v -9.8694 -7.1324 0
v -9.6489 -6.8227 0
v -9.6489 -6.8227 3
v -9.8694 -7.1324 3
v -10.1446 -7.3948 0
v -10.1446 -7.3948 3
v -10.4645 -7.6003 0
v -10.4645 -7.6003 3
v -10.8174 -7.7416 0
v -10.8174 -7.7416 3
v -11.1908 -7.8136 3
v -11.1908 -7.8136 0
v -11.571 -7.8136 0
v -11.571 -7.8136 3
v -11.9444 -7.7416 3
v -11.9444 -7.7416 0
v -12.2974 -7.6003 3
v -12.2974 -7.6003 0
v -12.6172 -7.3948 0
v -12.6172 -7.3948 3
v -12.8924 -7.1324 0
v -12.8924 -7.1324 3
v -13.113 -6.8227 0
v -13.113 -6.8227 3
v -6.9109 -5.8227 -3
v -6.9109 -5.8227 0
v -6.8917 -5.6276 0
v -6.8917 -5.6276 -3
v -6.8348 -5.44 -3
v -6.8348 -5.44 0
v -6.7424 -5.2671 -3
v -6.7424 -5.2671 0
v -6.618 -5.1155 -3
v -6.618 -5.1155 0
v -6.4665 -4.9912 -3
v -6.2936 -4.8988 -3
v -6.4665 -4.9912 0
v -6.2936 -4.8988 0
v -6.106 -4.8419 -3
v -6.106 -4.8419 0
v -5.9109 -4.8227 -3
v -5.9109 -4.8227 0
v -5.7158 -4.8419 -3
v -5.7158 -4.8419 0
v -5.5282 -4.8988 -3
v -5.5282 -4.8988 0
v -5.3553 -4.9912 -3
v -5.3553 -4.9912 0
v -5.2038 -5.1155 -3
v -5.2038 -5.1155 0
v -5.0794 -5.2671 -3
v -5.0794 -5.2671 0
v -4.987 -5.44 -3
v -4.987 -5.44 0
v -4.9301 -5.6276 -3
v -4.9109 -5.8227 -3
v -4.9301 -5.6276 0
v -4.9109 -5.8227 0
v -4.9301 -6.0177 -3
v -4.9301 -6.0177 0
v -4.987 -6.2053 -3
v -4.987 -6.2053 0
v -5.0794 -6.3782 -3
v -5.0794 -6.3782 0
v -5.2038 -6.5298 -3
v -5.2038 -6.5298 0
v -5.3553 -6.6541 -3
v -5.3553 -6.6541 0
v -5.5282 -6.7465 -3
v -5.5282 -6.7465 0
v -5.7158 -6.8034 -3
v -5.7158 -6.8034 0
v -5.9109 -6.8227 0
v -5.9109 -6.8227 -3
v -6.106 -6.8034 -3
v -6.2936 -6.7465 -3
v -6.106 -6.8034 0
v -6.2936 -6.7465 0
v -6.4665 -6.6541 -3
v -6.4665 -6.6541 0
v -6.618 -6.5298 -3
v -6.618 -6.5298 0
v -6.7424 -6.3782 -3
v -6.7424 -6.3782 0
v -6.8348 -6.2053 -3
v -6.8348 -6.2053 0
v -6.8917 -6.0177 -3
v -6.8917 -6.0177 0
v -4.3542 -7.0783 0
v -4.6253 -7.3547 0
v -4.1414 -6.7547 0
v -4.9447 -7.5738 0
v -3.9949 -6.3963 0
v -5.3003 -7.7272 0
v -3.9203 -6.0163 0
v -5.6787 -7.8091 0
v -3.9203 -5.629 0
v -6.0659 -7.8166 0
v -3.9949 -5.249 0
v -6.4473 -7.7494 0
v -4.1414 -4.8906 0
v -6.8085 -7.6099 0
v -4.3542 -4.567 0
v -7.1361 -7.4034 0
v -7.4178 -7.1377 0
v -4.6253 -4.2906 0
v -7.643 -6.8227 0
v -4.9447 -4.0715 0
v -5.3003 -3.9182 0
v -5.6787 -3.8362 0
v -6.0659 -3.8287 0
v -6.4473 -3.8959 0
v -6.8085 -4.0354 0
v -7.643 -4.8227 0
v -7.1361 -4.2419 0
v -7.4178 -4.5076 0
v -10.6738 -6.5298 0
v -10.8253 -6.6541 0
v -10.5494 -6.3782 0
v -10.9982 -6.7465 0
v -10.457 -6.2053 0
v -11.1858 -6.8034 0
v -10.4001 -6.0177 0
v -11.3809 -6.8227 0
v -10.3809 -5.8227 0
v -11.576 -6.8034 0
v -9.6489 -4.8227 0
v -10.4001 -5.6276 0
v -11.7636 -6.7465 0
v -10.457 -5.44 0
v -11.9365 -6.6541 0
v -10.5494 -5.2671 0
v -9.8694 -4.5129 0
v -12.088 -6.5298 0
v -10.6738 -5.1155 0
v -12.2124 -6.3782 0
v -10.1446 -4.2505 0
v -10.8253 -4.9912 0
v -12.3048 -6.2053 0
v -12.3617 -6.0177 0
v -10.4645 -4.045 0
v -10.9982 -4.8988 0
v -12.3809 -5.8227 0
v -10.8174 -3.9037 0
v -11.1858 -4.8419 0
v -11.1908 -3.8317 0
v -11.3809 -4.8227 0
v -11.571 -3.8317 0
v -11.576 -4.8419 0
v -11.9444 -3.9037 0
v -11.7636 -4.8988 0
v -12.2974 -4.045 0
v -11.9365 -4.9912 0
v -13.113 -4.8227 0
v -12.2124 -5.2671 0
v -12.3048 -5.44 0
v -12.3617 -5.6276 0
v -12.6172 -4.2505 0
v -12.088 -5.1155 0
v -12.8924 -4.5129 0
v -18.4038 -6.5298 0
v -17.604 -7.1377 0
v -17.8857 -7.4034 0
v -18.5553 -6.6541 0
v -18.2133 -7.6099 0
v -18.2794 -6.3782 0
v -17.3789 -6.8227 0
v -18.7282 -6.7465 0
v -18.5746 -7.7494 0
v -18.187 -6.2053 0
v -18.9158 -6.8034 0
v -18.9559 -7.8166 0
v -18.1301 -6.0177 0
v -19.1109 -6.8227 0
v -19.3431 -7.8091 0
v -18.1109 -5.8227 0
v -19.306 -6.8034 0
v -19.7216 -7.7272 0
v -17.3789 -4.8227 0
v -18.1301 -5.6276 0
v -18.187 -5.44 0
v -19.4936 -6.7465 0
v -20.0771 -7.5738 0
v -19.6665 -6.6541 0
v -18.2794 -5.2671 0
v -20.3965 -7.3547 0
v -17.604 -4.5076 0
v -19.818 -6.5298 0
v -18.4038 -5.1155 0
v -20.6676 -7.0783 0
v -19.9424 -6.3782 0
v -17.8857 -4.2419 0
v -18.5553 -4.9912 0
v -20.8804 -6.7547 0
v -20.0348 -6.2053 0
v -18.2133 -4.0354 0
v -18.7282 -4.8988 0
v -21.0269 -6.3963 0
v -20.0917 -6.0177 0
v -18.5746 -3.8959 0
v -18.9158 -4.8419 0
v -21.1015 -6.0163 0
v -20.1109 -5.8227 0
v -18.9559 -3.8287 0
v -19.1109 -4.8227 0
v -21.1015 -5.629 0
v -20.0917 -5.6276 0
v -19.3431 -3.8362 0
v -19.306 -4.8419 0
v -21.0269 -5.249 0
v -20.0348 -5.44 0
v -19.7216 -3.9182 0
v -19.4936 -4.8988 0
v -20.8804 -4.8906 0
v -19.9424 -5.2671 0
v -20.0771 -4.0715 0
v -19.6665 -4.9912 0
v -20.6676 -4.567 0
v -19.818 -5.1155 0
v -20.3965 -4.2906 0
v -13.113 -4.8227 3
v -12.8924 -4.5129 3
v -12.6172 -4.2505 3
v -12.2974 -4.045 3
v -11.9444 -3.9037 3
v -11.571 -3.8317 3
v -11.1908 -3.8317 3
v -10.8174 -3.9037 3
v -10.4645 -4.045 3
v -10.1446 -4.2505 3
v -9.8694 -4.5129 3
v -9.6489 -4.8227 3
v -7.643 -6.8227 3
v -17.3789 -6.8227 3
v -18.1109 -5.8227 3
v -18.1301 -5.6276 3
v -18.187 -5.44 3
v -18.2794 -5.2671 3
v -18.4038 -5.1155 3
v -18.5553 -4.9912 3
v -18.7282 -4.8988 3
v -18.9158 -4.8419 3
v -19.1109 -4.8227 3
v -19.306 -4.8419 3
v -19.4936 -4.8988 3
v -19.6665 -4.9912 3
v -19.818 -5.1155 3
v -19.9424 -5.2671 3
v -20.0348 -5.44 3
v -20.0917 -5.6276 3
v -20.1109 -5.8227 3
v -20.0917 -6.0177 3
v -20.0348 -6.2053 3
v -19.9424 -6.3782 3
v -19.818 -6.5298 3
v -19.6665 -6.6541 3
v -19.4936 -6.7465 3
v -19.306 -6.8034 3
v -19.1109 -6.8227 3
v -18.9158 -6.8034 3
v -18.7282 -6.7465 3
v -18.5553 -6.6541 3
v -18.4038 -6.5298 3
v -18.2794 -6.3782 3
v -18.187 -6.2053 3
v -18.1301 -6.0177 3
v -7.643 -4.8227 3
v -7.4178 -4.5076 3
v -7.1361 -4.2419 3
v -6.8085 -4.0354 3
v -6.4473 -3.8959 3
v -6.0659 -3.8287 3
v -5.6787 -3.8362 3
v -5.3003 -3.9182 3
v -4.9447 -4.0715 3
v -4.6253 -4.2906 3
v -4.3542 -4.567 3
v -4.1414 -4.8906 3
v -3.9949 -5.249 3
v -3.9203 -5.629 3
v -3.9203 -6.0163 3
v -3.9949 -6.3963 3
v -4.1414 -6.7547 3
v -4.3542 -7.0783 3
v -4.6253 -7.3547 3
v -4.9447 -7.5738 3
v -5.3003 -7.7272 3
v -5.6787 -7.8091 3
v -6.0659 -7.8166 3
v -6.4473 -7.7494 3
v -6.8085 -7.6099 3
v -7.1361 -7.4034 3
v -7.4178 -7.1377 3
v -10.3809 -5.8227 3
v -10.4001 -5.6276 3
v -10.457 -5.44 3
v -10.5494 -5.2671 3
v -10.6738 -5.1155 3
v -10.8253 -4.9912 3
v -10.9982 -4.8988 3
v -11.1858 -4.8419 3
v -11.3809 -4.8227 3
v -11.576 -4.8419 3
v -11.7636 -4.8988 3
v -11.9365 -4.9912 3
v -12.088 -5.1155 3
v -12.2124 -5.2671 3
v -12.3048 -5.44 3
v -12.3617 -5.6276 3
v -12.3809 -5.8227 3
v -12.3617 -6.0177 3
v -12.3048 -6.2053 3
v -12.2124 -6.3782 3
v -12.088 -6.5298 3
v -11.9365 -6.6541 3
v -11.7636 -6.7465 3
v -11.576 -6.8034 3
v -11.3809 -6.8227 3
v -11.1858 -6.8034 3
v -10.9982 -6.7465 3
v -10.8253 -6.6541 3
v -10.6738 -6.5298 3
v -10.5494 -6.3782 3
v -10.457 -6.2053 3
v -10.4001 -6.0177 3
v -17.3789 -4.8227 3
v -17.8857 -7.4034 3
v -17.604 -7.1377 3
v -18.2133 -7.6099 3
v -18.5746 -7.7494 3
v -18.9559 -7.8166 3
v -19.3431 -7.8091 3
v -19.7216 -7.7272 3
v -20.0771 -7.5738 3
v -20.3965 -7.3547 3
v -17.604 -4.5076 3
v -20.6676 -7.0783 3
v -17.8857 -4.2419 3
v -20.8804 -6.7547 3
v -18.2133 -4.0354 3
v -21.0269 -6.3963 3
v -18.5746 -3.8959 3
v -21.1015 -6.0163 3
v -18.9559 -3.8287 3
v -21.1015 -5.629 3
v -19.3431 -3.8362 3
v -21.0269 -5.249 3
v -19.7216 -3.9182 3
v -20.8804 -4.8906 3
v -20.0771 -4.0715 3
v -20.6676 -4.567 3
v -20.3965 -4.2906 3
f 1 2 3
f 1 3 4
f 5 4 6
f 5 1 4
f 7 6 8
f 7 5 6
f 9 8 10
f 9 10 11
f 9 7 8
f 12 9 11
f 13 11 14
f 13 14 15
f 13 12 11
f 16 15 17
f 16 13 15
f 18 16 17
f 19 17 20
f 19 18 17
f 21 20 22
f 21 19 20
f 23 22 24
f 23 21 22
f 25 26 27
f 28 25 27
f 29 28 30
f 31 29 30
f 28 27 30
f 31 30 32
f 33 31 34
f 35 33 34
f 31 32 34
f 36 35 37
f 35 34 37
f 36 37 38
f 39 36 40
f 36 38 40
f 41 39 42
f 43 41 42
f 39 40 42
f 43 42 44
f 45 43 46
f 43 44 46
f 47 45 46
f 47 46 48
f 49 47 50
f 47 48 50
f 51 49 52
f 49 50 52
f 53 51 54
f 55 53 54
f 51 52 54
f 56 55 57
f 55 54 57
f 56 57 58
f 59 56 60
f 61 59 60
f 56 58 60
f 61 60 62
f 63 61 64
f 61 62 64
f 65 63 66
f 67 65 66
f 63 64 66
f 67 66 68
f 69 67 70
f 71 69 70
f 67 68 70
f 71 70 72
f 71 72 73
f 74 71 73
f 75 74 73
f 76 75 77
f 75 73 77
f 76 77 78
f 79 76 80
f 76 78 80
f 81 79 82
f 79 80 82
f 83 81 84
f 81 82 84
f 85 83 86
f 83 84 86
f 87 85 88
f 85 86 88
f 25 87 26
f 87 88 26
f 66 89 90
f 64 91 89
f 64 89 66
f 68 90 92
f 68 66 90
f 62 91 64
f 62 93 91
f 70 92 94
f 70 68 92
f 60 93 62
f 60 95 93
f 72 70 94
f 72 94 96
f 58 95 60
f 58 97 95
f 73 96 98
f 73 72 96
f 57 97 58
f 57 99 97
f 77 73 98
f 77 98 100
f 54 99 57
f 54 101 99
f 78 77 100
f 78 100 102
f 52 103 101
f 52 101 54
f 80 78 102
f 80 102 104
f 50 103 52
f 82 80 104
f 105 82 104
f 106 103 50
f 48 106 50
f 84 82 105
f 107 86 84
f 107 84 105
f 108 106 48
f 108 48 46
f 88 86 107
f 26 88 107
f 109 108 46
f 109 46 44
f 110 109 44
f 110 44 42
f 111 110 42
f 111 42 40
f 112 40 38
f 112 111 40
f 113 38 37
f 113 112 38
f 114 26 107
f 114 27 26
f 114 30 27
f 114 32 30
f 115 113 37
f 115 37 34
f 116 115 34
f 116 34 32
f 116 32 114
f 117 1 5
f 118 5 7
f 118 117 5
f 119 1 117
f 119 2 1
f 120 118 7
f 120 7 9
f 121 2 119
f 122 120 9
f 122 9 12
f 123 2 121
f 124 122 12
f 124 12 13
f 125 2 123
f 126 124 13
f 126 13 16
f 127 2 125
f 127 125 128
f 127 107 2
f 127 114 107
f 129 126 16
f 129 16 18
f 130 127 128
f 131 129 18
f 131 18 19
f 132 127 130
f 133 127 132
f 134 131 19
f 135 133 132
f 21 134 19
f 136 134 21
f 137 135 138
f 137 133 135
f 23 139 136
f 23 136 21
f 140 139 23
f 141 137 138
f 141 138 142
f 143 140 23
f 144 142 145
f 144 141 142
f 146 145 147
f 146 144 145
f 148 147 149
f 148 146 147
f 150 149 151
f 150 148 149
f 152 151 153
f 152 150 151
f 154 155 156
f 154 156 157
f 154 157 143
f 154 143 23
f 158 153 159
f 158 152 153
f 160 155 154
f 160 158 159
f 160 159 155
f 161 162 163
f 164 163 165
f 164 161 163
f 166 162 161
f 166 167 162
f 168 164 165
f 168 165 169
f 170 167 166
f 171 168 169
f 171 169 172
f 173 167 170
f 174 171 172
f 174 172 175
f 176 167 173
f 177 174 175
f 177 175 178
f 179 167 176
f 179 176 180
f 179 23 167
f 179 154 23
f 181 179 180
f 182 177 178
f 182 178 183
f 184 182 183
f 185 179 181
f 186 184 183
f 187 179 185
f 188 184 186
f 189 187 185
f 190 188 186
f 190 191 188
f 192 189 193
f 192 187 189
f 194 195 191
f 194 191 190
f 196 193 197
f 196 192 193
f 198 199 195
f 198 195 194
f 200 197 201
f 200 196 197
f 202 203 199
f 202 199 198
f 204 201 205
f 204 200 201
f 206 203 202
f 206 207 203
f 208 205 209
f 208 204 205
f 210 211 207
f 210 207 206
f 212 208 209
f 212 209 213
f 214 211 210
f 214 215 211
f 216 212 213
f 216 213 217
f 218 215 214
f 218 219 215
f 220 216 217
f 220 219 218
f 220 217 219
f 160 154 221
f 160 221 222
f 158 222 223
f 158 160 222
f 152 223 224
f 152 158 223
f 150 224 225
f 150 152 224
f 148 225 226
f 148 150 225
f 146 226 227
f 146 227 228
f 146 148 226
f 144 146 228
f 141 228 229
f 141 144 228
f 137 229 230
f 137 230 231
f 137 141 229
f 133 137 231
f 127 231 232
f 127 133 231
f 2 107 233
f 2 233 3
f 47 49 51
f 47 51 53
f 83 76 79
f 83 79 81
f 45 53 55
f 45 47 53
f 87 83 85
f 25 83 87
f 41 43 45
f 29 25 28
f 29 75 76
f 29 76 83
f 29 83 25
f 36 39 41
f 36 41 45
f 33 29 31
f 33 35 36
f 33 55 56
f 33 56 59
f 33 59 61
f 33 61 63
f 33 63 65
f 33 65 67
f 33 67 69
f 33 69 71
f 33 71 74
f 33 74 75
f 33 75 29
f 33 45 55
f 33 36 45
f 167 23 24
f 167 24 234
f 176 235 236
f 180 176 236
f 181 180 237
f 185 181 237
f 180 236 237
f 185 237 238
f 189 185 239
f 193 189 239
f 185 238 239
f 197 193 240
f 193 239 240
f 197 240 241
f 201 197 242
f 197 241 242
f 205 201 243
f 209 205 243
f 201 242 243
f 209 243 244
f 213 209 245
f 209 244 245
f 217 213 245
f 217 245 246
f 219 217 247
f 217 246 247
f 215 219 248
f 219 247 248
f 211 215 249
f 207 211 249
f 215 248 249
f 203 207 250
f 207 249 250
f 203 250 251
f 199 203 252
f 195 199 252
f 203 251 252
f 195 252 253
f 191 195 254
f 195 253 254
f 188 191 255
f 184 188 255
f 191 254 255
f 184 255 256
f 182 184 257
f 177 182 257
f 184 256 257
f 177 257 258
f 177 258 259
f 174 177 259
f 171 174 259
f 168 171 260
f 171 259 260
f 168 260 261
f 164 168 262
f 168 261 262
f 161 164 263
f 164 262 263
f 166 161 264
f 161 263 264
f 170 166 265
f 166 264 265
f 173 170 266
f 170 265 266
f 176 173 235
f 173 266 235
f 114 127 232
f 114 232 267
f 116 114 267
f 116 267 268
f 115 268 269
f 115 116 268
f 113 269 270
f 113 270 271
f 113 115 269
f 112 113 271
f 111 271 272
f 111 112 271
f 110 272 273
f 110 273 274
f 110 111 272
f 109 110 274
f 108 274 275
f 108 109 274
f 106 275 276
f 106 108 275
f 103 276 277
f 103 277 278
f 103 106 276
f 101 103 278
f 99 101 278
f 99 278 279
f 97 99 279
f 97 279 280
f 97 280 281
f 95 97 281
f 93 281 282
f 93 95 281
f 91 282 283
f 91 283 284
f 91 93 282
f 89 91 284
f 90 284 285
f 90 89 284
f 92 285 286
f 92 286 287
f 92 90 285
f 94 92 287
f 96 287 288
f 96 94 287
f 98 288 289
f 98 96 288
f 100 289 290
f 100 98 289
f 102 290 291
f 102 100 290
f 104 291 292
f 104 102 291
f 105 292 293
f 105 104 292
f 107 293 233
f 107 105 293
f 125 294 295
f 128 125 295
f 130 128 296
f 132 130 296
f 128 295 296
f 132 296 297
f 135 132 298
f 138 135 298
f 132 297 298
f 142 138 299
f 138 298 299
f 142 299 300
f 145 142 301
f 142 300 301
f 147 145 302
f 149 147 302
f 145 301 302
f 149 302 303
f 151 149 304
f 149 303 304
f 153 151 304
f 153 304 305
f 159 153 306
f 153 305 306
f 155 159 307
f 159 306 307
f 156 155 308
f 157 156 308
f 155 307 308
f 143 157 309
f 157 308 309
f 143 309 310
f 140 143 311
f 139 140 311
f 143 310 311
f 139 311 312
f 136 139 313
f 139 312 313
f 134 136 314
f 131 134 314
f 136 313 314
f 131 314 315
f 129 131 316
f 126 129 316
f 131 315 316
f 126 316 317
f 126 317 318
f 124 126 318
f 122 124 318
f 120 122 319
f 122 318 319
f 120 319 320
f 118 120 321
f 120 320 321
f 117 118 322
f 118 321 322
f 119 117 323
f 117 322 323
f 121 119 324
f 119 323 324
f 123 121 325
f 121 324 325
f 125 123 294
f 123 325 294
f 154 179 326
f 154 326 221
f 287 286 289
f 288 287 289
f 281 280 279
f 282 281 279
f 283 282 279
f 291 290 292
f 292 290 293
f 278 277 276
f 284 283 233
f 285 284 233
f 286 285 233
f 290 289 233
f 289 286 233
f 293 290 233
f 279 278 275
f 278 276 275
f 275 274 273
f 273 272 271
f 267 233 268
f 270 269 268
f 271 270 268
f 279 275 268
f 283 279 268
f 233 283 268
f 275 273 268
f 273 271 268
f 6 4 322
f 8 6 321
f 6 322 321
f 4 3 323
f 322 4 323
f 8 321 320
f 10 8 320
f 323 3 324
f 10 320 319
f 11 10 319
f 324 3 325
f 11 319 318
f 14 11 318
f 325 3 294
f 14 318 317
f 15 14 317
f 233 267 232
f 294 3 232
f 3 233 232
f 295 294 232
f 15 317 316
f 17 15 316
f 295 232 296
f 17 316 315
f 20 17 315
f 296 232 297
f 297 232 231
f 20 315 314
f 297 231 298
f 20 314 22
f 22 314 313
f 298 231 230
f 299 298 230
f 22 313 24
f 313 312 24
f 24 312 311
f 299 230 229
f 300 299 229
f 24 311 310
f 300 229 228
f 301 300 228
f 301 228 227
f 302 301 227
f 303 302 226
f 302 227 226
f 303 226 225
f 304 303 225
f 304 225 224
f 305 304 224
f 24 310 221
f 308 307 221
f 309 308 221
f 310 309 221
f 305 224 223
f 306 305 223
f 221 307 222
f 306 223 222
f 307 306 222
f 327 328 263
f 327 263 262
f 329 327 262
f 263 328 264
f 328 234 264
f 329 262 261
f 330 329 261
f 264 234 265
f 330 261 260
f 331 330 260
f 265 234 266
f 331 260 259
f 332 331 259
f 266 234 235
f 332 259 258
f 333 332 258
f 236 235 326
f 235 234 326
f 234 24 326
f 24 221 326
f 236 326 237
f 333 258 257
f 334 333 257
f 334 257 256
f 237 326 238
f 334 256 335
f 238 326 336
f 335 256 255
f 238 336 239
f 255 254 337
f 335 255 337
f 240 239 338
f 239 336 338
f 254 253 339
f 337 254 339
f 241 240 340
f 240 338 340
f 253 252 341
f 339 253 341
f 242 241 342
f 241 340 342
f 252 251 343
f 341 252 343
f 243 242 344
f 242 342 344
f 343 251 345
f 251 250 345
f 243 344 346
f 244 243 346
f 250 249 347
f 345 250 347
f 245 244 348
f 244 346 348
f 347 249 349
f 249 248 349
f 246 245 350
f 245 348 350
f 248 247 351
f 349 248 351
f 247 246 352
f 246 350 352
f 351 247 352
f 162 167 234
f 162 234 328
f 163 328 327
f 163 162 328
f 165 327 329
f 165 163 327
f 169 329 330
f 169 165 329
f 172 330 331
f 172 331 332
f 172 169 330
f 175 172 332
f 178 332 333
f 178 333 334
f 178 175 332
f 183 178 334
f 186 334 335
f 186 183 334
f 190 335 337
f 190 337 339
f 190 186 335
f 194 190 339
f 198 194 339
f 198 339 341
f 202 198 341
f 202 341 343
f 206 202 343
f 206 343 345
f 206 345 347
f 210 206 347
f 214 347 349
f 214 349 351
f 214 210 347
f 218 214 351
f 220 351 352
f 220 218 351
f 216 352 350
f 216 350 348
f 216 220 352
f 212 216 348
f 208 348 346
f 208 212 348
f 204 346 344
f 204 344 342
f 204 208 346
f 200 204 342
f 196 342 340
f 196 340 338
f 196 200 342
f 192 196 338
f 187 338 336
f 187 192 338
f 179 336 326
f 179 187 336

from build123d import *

# Parameters (mm, degrees)
BOSS_EXTRUDE1_DEPTH = 3
SKETCH3_R           = 1
CUT_EXTRUDE1_DEPTH  = 3
SKETCH4_R           = 1
BOSS_EXTRUDE2_DEPTH = 3


with BuildPart() as part:
    # Sketch2 → Boss-Extrude1 (new body)
    with BuildSketch(Plane.XY):
        with BuildLine():
            Line((-17.378860002, -4.822654682), (-13.112961617, -4.822654682))
            ThreePointArc((-13.112961617, -4.822654682), (-11.380910809, -3.822654682), (-9.648860002, -4.822654682))
            Line((-9.648860002, -4.822654682), (-7.642961617, -4.822654682))
            ThreePointArc((-7.642961617, -4.822654682), (-3.910910809, -5.822654682), (-7.642961617, -6.822654682))
            Line((-7.642961617, -6.822654682), (-9.648860002, -6.822654682))
            ThreePointArc((-9.648860002, -6.822654682), (-11.380910809, -7.822654682), (-13.112961617, -6.822654682))
            Line((-13.112961617, -6.822654682), (-17.378860002, -6.822654682))
            ThreePointArc((-17.378860002, -6.822654682), (-21.110910809, -5.822654682), (-17.378860002, -4.822654682))
        make_face()
    extrude(amount=BOSS_EXTRUDE1_DEPTH)

    # Sketch3 → Cut-Extrude1 (cut)
    with BuildSketch(Plane.XY.offset(3)):
        with Locations((-11.380910809, -5.822654682)):
            Circle(SKETCH3_R)
        with Locations((-19.110910809, -5.822654682)):
            Circle(SKETCH3_R)
    extrude(amount=-CUT_EXTRUDE1_DEPTH, mode=Mode.SUBTRACT)

    # Sketch4 → Boss-Extrude2 (add)
    with BuildSketch(Plane(origin=(0, 0, 0), x_dir=(-1, 0, 0), z_dir=(0, 0, -1))):
        with Locations((5.910910809, -5.822654682)):
            Circle(SKETCH4_R)
    extrude(amount=BOSS_EXTRUDE2_DEPTH)


solid = part.part
